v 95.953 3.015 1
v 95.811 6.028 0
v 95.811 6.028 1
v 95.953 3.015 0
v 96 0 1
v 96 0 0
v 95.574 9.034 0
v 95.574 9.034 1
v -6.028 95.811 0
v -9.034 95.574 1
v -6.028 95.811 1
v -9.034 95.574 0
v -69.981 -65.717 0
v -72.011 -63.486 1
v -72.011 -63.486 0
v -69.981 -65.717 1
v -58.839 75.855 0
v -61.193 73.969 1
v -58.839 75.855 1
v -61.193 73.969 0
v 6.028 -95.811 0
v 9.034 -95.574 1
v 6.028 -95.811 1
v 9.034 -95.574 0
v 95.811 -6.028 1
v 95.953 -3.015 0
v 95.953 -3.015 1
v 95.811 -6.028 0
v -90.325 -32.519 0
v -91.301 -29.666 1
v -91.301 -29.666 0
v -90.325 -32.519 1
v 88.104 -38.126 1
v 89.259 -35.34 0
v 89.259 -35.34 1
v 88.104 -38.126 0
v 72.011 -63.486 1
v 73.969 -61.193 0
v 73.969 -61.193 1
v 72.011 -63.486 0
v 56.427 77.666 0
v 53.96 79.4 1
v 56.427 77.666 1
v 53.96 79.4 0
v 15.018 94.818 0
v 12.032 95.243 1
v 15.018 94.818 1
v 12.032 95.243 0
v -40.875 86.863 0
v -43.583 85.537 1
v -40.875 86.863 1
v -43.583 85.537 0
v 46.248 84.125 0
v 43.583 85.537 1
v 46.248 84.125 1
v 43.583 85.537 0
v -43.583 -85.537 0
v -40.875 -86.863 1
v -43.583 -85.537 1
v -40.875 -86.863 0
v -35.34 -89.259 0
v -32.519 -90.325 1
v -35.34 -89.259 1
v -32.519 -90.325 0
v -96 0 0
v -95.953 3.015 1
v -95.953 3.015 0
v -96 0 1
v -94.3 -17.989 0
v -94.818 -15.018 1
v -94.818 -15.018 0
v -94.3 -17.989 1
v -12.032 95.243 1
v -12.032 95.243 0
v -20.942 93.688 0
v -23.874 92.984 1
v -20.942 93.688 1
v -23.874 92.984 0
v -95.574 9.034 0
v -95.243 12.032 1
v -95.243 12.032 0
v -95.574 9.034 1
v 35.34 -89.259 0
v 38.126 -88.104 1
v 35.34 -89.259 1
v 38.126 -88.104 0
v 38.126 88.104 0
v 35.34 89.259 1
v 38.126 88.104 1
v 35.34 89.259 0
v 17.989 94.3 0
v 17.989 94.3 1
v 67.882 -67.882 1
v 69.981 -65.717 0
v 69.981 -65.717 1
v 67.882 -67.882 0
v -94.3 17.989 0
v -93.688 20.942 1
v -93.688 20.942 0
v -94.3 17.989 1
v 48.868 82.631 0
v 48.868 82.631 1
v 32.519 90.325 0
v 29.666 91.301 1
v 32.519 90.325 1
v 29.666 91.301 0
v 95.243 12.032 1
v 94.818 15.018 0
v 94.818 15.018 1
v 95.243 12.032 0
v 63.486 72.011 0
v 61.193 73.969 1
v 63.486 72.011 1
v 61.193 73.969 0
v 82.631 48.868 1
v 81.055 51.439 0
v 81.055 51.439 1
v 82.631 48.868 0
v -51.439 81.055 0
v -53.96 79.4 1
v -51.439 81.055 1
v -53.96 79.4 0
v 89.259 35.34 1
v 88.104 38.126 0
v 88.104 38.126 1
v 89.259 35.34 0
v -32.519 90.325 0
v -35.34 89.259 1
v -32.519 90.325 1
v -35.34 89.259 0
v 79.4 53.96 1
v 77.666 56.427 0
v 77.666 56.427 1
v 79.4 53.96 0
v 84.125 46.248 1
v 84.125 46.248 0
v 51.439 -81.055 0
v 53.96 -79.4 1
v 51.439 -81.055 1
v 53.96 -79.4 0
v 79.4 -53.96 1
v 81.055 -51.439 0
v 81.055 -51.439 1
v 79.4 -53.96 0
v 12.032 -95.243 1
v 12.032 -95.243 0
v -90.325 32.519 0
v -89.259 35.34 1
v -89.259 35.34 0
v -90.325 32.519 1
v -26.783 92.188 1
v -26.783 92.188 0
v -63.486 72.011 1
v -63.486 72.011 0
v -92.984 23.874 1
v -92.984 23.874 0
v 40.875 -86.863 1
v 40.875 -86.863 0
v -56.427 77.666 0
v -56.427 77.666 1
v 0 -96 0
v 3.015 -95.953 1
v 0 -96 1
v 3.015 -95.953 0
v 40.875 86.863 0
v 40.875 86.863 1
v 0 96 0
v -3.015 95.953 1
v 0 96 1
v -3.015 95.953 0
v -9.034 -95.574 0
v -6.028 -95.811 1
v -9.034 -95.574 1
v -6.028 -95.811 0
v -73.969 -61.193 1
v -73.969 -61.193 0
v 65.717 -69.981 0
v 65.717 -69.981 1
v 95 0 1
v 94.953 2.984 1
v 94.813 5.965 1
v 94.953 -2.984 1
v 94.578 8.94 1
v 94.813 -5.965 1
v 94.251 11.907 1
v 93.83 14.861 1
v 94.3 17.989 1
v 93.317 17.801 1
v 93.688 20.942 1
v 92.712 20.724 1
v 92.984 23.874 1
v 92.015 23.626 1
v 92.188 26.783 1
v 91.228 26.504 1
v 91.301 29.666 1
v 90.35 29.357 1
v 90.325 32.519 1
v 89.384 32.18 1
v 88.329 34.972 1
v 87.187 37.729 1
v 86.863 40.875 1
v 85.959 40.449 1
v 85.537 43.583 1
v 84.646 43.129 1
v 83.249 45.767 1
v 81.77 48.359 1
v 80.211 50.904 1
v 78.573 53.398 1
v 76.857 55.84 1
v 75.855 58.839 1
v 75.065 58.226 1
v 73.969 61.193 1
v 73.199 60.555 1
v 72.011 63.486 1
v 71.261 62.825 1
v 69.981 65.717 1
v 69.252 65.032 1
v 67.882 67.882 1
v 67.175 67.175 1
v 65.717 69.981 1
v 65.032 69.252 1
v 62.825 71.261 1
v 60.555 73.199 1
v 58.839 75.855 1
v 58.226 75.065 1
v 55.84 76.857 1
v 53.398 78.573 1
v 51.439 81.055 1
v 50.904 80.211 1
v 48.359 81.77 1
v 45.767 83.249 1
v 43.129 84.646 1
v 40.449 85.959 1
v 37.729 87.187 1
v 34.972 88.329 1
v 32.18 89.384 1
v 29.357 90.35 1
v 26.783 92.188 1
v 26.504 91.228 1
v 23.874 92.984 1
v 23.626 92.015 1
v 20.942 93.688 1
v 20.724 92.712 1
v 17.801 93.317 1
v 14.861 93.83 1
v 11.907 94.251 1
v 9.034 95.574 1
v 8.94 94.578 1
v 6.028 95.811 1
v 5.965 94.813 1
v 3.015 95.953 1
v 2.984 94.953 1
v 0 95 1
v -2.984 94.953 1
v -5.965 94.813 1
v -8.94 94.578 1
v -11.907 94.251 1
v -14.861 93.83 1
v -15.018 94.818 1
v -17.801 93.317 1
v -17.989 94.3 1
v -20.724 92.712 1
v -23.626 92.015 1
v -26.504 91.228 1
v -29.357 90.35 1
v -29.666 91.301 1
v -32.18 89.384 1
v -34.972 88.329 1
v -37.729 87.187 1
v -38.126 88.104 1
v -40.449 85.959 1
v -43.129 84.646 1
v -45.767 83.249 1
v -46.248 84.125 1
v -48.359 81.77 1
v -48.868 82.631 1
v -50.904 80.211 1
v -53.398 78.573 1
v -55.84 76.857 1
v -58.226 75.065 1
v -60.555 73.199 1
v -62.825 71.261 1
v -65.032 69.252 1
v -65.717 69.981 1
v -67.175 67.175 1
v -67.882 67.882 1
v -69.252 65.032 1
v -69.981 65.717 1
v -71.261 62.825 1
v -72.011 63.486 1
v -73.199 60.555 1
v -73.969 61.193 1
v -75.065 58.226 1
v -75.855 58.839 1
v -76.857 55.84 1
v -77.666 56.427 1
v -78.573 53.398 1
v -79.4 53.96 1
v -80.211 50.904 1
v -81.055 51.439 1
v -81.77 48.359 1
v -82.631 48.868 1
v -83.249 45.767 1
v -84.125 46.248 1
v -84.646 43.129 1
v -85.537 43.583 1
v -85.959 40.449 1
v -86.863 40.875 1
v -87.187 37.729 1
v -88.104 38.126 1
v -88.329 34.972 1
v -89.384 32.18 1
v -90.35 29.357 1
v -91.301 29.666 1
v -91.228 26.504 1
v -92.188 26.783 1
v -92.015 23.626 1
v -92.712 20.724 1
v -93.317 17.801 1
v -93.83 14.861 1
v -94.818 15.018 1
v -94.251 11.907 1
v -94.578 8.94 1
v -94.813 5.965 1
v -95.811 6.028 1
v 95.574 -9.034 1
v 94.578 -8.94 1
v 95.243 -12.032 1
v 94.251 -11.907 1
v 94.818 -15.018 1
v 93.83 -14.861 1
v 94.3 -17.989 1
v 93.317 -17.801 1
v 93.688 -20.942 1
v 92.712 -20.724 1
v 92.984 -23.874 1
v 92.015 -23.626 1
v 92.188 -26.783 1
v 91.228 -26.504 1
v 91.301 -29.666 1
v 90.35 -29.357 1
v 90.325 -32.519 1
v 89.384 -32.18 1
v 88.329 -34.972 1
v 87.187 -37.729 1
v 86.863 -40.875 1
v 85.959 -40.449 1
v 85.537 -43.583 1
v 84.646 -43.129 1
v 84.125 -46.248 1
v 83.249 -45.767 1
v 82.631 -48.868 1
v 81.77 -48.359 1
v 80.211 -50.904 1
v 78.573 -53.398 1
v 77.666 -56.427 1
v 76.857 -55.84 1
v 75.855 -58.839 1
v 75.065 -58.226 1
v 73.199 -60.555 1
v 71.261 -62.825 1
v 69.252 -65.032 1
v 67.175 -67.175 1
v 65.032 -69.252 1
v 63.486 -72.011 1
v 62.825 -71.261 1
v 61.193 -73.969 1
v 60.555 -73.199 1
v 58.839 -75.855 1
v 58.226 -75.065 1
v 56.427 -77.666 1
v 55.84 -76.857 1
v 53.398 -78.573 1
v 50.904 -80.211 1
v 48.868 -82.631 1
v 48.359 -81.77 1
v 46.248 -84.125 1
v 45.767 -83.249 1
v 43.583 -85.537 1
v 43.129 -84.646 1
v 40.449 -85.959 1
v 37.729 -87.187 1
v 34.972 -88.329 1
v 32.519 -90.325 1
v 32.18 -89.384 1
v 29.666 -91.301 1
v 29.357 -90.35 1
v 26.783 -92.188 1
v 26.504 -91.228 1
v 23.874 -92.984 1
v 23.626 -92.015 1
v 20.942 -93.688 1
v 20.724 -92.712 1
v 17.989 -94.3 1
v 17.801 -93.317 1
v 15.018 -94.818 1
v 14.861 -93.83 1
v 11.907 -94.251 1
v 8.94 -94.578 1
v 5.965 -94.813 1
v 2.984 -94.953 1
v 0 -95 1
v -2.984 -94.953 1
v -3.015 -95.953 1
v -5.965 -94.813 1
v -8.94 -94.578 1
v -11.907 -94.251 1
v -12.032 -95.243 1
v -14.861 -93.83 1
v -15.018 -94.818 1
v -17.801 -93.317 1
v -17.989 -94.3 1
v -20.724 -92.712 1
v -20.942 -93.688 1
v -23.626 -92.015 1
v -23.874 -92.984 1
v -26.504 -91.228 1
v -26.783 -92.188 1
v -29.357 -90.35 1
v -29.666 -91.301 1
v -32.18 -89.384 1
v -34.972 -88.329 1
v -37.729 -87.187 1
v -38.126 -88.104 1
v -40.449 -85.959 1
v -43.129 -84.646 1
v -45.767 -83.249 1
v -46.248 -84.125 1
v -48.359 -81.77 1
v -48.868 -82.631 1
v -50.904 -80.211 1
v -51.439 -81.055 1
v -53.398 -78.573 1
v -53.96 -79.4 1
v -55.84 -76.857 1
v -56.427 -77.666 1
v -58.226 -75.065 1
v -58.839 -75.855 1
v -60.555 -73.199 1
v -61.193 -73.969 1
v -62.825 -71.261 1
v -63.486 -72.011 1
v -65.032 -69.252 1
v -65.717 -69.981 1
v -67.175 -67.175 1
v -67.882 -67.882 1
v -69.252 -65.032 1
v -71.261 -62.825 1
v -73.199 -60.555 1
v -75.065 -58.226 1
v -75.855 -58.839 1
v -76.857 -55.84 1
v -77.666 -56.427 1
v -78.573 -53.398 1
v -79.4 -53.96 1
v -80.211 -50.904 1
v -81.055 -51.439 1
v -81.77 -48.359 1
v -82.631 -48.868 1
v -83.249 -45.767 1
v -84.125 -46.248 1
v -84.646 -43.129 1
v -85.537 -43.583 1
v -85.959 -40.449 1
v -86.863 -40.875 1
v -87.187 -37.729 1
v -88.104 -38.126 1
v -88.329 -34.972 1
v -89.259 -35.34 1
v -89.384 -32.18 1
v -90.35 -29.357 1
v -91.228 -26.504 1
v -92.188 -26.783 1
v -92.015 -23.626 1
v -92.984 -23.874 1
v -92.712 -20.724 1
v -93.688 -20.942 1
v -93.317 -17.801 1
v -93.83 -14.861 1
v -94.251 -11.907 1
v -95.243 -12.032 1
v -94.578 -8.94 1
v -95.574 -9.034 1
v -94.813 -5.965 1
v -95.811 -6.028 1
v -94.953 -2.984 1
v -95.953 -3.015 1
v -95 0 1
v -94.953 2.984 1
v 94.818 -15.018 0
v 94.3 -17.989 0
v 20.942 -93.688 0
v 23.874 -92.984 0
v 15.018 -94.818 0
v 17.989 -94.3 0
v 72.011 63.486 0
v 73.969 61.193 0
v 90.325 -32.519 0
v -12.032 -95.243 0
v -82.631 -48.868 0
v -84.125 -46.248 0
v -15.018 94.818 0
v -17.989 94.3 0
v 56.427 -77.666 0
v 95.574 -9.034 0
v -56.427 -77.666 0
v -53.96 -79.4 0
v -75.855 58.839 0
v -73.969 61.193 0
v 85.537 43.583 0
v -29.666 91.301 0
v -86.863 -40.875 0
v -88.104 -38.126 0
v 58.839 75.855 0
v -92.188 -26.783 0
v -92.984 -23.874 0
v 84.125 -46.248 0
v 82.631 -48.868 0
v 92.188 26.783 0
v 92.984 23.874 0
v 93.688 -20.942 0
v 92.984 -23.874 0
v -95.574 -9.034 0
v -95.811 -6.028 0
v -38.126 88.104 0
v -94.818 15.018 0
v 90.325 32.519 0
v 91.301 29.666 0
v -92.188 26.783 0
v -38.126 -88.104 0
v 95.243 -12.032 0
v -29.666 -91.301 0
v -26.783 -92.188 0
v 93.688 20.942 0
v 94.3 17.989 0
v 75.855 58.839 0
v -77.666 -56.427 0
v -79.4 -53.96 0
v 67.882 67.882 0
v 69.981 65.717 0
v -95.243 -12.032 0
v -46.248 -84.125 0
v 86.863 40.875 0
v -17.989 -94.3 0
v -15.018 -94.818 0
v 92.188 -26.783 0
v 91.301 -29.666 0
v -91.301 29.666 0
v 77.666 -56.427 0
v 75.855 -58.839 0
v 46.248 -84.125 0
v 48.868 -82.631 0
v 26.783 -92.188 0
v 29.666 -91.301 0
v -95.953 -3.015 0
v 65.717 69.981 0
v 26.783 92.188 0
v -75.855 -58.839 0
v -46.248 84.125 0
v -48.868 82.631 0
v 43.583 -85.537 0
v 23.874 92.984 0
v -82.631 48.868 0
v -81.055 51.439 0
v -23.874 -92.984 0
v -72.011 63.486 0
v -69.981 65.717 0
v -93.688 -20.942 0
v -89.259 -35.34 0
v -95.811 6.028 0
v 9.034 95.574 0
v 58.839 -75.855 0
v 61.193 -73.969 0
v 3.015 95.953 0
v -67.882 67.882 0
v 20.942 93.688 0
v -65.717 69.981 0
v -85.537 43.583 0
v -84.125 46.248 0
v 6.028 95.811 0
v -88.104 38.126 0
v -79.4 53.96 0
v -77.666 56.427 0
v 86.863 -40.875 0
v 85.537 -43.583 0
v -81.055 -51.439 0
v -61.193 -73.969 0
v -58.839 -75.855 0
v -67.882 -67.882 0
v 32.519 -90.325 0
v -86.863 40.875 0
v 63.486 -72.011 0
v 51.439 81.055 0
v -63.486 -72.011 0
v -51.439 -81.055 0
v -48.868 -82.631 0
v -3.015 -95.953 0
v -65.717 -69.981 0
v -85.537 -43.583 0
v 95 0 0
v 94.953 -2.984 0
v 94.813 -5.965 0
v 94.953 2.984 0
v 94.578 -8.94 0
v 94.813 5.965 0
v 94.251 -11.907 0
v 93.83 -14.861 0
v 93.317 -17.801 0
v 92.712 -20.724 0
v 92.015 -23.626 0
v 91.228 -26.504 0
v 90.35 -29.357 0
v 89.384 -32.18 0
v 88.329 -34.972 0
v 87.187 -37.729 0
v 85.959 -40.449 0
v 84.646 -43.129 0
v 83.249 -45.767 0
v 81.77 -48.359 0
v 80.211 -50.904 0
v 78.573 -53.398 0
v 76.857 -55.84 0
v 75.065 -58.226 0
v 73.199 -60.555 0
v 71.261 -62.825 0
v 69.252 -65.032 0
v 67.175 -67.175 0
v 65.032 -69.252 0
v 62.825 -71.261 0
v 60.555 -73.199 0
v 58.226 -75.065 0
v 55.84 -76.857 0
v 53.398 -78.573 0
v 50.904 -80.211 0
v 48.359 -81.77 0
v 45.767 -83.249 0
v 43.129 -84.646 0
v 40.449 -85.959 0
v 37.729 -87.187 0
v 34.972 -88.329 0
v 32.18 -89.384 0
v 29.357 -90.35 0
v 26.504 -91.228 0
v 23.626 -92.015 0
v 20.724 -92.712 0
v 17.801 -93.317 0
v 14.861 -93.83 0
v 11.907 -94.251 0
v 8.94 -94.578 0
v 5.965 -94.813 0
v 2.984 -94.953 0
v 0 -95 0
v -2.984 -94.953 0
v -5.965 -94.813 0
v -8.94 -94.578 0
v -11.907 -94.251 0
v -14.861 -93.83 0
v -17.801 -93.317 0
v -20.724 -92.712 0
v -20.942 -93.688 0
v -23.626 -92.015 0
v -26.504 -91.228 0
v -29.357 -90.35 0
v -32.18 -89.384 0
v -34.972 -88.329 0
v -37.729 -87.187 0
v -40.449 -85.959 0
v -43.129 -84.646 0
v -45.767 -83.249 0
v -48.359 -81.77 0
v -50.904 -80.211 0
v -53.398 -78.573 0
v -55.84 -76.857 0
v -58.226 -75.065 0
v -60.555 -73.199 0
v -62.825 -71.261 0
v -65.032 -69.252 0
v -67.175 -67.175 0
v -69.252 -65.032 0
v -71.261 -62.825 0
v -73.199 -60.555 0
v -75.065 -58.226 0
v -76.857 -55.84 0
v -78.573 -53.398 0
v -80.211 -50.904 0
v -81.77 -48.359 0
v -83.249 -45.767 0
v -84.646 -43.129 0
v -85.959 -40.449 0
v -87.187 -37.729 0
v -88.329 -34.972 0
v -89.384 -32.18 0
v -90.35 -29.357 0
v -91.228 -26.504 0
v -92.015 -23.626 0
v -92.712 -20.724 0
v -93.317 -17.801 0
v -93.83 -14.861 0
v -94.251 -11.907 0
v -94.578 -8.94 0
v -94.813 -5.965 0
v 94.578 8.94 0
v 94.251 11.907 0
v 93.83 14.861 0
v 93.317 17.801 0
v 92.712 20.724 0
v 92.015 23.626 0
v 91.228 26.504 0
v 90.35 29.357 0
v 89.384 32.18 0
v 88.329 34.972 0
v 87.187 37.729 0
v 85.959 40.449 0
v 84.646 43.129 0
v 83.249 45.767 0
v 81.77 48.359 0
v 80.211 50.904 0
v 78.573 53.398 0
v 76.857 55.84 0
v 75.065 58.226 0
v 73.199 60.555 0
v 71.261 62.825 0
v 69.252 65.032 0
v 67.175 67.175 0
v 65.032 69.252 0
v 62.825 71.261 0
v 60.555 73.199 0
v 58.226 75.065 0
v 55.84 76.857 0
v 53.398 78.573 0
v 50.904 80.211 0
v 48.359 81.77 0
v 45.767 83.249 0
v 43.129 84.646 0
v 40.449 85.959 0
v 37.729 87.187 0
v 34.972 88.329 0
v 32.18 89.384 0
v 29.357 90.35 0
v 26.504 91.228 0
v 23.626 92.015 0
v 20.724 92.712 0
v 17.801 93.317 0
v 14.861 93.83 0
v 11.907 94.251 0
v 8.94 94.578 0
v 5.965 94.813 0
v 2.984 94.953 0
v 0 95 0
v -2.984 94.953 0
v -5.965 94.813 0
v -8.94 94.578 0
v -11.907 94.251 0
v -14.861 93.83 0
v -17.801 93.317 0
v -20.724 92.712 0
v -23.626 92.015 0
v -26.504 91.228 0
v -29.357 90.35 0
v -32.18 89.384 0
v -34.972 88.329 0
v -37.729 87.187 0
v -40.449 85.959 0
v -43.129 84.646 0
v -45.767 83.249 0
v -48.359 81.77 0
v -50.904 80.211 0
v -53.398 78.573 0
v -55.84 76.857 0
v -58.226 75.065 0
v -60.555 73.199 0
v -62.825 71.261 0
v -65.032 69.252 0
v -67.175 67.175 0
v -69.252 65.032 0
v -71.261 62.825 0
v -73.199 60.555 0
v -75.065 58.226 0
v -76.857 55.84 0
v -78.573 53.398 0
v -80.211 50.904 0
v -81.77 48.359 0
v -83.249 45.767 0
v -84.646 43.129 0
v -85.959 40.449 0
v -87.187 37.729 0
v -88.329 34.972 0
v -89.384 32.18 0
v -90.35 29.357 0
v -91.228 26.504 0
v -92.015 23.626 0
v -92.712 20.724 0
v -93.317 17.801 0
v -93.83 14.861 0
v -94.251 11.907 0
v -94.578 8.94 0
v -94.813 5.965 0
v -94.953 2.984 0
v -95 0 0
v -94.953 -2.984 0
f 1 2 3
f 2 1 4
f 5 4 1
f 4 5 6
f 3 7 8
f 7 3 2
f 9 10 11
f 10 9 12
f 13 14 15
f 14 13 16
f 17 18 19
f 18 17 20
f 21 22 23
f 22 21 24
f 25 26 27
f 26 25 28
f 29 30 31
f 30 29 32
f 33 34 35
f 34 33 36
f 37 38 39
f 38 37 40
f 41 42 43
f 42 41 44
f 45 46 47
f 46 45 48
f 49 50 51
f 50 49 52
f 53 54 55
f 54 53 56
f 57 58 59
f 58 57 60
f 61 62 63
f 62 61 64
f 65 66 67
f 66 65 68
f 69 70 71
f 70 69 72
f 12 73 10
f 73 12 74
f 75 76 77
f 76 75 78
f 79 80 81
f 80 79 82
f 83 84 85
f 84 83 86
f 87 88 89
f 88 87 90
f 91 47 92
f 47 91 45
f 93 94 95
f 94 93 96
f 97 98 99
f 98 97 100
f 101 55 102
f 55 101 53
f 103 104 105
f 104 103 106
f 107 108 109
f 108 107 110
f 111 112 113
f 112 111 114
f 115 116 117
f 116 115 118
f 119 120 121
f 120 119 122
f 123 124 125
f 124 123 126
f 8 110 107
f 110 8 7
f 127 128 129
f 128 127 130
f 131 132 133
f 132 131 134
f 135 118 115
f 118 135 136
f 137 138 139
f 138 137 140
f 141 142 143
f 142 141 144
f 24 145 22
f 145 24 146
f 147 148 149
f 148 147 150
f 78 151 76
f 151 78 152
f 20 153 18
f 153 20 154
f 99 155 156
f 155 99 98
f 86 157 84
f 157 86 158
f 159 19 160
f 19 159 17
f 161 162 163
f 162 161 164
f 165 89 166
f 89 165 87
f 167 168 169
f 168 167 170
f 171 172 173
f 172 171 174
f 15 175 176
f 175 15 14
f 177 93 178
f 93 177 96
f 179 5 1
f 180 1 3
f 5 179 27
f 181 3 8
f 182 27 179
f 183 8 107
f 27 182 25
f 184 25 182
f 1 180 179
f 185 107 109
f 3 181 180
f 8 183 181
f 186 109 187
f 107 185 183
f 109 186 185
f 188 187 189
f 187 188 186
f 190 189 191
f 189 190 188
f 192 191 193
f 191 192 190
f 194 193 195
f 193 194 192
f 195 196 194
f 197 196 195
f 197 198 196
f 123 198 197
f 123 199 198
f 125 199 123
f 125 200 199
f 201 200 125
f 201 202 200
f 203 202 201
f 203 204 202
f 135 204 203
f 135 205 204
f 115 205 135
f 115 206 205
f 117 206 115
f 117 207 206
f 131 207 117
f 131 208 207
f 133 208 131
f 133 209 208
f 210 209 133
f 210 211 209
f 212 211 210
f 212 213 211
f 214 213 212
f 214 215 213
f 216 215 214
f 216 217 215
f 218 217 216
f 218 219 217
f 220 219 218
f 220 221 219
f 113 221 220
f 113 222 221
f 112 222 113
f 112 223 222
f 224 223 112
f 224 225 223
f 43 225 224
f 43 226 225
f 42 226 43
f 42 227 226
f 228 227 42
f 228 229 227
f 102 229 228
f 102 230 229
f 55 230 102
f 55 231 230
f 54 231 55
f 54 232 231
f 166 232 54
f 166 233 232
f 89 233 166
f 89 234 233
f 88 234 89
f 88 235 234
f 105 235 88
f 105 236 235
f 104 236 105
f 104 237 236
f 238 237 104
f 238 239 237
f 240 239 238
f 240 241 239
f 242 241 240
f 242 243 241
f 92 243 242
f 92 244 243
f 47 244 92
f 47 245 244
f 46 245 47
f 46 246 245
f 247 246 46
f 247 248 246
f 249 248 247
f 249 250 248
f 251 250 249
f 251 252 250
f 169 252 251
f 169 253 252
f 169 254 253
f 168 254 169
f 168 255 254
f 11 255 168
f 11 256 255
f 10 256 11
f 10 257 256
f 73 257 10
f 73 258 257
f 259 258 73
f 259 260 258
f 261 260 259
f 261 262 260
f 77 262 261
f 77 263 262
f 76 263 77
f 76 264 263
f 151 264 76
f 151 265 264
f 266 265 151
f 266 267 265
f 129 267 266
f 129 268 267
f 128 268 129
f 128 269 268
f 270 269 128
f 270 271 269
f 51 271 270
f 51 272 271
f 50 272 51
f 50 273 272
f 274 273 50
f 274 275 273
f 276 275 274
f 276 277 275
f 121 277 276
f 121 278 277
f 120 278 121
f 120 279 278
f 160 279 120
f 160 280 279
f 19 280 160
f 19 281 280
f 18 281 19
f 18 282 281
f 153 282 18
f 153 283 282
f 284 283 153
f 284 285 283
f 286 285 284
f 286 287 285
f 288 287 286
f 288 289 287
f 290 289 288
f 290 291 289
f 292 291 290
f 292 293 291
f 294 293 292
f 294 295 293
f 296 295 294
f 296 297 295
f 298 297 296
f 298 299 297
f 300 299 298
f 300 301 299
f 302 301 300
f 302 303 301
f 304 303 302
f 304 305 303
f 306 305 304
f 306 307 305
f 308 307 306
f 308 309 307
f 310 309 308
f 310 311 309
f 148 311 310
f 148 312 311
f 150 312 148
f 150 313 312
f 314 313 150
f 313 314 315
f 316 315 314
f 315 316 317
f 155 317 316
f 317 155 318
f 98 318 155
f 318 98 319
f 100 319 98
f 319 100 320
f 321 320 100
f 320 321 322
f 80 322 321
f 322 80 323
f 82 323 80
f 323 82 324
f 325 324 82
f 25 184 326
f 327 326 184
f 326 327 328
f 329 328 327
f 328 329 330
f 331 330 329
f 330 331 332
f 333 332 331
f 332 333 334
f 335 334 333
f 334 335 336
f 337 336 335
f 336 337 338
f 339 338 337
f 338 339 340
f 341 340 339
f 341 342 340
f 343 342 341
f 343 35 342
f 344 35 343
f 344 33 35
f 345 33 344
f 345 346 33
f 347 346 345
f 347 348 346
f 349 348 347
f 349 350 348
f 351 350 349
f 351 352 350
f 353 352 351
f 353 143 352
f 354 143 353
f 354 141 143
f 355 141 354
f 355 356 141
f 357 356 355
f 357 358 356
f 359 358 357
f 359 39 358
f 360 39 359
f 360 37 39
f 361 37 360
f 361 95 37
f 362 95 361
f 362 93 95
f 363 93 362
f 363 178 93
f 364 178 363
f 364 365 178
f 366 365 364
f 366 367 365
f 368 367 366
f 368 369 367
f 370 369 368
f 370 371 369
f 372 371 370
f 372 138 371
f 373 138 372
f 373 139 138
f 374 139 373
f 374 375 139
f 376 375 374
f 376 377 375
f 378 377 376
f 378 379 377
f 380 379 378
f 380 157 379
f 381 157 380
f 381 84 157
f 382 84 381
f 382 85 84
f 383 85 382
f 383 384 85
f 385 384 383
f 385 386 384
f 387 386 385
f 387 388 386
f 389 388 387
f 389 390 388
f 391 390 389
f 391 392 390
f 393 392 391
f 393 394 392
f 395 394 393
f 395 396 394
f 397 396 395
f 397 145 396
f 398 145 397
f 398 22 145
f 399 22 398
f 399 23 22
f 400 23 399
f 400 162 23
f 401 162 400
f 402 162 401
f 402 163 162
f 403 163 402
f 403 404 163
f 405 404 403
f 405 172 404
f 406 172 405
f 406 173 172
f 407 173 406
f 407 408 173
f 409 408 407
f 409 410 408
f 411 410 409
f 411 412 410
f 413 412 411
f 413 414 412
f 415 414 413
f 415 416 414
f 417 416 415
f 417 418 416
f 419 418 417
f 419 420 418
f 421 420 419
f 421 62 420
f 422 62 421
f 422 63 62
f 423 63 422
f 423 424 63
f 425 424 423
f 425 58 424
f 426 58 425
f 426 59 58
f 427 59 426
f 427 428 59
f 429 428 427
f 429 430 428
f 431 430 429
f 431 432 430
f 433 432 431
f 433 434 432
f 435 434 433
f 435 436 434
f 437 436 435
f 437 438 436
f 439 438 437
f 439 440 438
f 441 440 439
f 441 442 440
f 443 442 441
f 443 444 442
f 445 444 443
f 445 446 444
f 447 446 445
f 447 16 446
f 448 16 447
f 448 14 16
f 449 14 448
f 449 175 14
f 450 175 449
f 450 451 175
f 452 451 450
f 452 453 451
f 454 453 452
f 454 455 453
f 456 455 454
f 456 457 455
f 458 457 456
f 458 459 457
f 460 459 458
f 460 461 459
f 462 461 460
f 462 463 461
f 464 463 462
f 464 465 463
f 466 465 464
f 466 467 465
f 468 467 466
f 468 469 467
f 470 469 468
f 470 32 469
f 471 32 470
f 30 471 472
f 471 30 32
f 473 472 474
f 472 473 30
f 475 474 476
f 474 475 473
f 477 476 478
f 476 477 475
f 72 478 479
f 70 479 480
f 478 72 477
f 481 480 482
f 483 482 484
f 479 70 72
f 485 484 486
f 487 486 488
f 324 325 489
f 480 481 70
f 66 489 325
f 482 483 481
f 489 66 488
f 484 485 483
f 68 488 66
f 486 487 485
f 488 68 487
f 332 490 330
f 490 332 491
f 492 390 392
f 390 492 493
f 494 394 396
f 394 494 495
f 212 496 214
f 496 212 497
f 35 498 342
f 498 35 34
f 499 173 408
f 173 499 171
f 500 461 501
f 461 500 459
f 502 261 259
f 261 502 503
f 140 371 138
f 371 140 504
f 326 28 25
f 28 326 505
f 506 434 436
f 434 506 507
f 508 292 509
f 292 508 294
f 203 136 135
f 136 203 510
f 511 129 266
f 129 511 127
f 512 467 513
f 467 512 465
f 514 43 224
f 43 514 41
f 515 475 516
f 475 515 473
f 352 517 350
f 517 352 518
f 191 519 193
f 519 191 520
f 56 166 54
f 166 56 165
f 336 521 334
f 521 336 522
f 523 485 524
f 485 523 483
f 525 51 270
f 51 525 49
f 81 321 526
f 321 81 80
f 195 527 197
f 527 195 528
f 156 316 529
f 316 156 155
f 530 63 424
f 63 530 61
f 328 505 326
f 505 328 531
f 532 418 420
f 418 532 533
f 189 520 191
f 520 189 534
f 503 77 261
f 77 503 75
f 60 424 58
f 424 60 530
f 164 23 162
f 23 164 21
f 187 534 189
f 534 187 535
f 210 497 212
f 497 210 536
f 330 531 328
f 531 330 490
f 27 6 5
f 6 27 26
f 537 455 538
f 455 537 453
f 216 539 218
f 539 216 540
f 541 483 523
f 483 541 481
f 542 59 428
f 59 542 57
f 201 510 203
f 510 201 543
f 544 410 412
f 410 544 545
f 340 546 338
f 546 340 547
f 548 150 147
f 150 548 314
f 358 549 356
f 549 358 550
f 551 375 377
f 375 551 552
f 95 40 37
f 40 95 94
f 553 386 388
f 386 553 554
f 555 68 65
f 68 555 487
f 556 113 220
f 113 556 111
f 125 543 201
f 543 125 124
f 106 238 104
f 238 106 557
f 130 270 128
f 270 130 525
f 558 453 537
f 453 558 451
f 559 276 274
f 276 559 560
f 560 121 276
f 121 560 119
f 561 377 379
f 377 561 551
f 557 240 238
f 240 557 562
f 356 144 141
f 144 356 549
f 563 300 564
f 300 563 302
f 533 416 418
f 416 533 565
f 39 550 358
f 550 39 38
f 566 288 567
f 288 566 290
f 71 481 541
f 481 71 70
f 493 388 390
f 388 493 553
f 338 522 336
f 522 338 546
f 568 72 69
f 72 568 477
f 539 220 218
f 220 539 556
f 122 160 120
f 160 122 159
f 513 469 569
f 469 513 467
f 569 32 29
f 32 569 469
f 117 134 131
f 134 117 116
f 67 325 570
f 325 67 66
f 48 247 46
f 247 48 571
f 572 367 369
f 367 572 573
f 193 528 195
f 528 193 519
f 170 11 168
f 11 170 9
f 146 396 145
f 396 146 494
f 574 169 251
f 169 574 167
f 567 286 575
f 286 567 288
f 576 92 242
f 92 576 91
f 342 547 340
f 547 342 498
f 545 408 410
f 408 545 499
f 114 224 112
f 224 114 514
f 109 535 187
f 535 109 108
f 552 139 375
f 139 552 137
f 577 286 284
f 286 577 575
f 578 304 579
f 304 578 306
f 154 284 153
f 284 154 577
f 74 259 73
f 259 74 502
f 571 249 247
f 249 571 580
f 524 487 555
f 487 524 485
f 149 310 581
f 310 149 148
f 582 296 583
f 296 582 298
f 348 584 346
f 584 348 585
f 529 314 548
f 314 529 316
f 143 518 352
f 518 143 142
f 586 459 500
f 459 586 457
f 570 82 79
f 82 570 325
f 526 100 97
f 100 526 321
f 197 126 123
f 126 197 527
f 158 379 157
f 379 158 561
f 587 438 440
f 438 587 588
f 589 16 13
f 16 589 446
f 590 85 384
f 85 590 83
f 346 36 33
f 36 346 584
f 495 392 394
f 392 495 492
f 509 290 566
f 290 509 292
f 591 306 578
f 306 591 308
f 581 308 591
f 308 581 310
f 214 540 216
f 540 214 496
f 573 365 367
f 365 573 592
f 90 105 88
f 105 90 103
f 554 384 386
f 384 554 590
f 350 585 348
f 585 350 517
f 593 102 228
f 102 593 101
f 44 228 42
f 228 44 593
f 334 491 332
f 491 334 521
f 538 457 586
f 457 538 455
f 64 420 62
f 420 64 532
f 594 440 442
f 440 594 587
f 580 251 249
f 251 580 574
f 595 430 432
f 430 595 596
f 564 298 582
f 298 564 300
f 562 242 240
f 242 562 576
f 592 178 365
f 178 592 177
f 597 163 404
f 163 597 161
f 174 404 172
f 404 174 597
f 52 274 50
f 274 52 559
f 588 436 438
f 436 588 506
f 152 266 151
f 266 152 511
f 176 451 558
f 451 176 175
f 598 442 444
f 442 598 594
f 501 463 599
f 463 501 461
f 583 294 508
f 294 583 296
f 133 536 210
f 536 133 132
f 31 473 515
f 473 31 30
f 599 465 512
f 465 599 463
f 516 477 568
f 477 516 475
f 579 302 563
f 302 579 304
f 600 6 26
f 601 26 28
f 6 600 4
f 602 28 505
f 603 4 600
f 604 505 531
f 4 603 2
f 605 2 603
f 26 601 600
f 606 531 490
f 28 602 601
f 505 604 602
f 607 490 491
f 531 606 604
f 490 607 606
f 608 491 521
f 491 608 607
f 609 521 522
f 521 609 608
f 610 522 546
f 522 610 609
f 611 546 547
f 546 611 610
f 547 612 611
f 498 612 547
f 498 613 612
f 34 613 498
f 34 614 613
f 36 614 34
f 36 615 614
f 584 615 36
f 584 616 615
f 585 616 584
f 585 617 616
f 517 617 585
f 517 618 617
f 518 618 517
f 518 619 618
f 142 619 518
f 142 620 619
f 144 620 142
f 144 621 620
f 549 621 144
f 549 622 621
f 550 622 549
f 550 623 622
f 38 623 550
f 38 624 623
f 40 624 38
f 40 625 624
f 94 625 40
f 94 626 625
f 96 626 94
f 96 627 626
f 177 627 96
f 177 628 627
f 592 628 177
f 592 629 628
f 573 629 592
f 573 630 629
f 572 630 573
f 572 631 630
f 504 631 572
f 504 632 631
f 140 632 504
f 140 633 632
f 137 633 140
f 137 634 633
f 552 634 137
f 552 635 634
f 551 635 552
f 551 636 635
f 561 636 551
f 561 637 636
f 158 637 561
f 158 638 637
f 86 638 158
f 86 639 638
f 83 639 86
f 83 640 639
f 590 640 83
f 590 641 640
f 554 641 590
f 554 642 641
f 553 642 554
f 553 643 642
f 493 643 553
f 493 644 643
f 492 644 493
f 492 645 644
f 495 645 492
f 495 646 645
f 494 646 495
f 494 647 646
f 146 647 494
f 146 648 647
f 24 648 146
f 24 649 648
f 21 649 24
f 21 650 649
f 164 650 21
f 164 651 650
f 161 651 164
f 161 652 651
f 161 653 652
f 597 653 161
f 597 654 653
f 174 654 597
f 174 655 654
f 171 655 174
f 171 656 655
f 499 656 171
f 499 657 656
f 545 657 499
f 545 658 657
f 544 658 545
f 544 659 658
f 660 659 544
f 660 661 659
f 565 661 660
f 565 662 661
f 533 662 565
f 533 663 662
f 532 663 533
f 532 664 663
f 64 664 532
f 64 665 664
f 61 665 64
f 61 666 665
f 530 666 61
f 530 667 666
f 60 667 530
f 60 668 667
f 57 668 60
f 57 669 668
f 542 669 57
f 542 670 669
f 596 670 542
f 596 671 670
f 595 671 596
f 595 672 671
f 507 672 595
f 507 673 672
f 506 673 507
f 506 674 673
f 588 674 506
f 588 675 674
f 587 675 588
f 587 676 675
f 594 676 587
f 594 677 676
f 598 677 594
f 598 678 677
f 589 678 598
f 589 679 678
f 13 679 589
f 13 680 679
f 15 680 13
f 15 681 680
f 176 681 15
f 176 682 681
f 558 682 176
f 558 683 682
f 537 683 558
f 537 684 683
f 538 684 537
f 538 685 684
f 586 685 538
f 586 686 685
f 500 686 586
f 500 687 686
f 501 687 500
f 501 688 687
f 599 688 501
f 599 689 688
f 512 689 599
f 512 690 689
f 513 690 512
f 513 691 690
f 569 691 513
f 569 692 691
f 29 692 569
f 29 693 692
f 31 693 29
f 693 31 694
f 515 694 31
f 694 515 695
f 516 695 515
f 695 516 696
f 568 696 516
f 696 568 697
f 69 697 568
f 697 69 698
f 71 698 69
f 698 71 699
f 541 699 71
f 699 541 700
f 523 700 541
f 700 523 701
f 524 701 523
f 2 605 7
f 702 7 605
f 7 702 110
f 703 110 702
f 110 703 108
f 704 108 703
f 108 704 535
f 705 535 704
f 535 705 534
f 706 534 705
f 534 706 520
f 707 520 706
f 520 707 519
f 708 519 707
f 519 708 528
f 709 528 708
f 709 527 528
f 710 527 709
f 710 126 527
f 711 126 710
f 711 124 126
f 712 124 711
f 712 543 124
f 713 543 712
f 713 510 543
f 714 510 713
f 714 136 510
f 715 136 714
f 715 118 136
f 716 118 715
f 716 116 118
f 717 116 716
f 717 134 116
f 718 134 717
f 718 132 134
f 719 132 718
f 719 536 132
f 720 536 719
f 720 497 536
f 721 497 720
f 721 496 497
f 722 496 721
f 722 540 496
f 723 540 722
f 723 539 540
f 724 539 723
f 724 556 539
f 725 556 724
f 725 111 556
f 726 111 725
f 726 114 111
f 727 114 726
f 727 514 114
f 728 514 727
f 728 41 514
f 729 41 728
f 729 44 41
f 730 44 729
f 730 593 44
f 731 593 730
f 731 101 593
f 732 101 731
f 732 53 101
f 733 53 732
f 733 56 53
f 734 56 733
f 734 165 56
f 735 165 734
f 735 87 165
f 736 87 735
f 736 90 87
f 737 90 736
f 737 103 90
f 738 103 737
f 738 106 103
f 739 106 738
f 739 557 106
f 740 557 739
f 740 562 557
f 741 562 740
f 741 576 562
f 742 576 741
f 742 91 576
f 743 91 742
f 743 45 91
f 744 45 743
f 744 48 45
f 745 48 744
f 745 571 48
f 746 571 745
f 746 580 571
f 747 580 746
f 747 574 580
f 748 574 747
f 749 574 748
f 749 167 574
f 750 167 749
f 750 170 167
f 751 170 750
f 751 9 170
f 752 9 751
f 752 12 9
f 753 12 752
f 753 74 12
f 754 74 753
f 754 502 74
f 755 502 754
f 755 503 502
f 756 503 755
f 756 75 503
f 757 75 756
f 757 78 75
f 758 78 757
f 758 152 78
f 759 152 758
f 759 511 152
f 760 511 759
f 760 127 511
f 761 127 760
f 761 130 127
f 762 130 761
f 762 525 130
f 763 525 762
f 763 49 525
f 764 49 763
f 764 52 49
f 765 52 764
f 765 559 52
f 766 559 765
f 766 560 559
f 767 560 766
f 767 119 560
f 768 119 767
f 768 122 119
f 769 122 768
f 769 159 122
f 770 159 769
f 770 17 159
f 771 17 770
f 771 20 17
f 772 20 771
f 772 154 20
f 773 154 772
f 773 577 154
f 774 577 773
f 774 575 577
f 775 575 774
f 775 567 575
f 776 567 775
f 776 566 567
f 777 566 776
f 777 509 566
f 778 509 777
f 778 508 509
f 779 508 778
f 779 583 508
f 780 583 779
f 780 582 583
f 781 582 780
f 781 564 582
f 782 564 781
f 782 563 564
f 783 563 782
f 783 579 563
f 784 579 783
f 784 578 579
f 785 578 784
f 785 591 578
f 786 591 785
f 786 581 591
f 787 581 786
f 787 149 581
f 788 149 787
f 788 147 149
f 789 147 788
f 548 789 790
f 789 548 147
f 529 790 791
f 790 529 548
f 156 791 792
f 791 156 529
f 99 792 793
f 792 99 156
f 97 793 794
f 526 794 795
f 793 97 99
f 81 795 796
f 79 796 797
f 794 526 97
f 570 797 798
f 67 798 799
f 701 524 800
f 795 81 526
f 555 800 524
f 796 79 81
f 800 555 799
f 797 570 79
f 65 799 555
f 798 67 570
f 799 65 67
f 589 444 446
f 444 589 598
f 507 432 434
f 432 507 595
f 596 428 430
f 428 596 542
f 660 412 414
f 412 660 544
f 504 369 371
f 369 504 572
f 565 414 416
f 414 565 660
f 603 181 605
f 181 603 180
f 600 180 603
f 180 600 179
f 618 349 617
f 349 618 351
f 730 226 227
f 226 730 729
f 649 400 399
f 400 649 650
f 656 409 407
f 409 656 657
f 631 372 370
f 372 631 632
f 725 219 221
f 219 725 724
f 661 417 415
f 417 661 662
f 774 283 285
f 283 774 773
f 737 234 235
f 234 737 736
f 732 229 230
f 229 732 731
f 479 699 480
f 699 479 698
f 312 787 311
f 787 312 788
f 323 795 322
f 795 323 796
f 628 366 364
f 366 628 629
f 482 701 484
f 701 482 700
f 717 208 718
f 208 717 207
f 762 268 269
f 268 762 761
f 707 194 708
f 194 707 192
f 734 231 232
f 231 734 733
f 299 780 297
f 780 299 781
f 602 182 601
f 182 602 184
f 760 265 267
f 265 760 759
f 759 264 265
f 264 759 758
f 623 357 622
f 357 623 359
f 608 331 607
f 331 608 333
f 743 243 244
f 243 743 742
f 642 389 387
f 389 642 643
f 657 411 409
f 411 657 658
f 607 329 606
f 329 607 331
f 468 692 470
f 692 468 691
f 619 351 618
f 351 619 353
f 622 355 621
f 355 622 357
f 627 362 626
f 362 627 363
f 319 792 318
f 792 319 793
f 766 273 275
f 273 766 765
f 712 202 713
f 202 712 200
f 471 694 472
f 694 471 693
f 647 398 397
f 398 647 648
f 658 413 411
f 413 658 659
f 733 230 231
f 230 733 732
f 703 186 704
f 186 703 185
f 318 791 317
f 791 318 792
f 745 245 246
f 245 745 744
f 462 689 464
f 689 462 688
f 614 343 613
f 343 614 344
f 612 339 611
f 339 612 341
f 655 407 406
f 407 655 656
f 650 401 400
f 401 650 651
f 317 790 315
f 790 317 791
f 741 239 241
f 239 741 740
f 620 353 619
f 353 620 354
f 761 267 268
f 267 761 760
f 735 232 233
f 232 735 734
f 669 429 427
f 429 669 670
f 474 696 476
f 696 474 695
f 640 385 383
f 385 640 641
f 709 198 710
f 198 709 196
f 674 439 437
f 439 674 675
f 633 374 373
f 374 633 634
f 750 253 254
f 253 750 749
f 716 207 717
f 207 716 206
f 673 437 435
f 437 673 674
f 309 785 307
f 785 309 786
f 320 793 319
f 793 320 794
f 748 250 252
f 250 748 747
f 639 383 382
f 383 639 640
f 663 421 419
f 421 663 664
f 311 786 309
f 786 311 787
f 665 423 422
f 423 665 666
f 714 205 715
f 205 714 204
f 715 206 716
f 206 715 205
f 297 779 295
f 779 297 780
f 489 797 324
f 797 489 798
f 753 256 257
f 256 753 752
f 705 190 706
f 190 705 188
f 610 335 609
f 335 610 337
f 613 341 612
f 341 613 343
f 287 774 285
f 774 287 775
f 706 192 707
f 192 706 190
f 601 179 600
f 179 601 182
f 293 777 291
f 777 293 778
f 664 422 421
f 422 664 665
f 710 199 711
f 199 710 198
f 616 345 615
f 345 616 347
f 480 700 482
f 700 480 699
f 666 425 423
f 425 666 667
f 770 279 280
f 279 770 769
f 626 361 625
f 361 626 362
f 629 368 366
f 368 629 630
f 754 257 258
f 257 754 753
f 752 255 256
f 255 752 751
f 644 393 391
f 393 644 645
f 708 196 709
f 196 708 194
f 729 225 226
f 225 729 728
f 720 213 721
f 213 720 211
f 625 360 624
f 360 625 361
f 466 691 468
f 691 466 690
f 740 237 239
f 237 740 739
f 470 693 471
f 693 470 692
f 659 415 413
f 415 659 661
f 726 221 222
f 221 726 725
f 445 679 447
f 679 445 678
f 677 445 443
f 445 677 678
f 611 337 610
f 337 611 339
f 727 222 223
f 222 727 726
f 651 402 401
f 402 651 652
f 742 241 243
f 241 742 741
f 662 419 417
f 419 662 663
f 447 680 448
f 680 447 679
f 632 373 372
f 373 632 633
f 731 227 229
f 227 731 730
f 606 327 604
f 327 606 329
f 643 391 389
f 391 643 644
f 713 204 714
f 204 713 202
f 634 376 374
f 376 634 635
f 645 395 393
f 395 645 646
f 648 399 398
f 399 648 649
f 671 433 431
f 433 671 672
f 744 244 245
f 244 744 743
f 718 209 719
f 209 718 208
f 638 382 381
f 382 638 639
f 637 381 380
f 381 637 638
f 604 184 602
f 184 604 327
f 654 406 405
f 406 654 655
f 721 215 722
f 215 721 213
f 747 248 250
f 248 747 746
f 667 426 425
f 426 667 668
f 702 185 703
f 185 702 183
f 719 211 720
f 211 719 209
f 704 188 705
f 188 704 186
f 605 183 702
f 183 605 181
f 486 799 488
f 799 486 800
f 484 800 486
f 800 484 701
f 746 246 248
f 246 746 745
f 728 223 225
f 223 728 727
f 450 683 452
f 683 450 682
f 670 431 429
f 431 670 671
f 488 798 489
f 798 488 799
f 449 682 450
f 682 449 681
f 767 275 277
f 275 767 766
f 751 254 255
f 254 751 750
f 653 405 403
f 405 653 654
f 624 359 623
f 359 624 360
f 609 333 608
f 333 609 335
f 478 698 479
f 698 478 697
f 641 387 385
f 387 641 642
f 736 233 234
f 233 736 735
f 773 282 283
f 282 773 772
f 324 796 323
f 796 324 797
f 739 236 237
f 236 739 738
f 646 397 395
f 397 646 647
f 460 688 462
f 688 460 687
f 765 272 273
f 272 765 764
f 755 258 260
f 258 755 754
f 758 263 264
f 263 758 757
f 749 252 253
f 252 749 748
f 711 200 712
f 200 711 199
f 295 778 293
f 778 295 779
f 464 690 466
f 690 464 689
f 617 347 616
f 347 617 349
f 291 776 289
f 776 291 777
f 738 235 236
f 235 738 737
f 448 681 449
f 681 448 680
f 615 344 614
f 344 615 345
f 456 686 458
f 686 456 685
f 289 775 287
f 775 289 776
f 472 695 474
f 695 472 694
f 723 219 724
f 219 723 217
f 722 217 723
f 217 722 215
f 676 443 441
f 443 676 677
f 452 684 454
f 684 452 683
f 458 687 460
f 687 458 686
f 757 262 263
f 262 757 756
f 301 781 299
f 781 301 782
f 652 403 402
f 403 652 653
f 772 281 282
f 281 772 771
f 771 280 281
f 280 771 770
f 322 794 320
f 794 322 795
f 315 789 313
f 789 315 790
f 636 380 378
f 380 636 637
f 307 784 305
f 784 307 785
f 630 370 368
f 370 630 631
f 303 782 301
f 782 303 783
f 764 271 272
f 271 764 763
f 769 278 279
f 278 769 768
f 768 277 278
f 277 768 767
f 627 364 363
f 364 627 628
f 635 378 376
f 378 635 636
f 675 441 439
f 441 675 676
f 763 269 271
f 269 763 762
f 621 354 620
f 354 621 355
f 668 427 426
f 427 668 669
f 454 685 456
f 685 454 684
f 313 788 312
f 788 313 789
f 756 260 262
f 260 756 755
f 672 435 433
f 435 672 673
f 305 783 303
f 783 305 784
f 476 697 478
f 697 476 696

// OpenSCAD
// /********************************************************           
//  * Variable cicle for collision calibration             *   
//  *                                                      *   
//  * Author:  Adam, Kuczmik                               *   
//  *                                                      *   
//  * Purpose: For collision calibration of a delta 3d     *
//  * Printer (1 mm height)                                *   
//  *                                                      *   
//  * Usage:                                               *   
//  *      Run it in OpenSCAD version 2015.03-2            *   
//  ********************************************************/  
//
//
//
// Radius of the Ring [mm]
Radius= 96; 
 
 difference() {
    cylinder(h=1, r=Radius, center=false, $fn=200);
    cylinder(h=1, r=Radius-1, center=false, $fn=200);  
 }

 
